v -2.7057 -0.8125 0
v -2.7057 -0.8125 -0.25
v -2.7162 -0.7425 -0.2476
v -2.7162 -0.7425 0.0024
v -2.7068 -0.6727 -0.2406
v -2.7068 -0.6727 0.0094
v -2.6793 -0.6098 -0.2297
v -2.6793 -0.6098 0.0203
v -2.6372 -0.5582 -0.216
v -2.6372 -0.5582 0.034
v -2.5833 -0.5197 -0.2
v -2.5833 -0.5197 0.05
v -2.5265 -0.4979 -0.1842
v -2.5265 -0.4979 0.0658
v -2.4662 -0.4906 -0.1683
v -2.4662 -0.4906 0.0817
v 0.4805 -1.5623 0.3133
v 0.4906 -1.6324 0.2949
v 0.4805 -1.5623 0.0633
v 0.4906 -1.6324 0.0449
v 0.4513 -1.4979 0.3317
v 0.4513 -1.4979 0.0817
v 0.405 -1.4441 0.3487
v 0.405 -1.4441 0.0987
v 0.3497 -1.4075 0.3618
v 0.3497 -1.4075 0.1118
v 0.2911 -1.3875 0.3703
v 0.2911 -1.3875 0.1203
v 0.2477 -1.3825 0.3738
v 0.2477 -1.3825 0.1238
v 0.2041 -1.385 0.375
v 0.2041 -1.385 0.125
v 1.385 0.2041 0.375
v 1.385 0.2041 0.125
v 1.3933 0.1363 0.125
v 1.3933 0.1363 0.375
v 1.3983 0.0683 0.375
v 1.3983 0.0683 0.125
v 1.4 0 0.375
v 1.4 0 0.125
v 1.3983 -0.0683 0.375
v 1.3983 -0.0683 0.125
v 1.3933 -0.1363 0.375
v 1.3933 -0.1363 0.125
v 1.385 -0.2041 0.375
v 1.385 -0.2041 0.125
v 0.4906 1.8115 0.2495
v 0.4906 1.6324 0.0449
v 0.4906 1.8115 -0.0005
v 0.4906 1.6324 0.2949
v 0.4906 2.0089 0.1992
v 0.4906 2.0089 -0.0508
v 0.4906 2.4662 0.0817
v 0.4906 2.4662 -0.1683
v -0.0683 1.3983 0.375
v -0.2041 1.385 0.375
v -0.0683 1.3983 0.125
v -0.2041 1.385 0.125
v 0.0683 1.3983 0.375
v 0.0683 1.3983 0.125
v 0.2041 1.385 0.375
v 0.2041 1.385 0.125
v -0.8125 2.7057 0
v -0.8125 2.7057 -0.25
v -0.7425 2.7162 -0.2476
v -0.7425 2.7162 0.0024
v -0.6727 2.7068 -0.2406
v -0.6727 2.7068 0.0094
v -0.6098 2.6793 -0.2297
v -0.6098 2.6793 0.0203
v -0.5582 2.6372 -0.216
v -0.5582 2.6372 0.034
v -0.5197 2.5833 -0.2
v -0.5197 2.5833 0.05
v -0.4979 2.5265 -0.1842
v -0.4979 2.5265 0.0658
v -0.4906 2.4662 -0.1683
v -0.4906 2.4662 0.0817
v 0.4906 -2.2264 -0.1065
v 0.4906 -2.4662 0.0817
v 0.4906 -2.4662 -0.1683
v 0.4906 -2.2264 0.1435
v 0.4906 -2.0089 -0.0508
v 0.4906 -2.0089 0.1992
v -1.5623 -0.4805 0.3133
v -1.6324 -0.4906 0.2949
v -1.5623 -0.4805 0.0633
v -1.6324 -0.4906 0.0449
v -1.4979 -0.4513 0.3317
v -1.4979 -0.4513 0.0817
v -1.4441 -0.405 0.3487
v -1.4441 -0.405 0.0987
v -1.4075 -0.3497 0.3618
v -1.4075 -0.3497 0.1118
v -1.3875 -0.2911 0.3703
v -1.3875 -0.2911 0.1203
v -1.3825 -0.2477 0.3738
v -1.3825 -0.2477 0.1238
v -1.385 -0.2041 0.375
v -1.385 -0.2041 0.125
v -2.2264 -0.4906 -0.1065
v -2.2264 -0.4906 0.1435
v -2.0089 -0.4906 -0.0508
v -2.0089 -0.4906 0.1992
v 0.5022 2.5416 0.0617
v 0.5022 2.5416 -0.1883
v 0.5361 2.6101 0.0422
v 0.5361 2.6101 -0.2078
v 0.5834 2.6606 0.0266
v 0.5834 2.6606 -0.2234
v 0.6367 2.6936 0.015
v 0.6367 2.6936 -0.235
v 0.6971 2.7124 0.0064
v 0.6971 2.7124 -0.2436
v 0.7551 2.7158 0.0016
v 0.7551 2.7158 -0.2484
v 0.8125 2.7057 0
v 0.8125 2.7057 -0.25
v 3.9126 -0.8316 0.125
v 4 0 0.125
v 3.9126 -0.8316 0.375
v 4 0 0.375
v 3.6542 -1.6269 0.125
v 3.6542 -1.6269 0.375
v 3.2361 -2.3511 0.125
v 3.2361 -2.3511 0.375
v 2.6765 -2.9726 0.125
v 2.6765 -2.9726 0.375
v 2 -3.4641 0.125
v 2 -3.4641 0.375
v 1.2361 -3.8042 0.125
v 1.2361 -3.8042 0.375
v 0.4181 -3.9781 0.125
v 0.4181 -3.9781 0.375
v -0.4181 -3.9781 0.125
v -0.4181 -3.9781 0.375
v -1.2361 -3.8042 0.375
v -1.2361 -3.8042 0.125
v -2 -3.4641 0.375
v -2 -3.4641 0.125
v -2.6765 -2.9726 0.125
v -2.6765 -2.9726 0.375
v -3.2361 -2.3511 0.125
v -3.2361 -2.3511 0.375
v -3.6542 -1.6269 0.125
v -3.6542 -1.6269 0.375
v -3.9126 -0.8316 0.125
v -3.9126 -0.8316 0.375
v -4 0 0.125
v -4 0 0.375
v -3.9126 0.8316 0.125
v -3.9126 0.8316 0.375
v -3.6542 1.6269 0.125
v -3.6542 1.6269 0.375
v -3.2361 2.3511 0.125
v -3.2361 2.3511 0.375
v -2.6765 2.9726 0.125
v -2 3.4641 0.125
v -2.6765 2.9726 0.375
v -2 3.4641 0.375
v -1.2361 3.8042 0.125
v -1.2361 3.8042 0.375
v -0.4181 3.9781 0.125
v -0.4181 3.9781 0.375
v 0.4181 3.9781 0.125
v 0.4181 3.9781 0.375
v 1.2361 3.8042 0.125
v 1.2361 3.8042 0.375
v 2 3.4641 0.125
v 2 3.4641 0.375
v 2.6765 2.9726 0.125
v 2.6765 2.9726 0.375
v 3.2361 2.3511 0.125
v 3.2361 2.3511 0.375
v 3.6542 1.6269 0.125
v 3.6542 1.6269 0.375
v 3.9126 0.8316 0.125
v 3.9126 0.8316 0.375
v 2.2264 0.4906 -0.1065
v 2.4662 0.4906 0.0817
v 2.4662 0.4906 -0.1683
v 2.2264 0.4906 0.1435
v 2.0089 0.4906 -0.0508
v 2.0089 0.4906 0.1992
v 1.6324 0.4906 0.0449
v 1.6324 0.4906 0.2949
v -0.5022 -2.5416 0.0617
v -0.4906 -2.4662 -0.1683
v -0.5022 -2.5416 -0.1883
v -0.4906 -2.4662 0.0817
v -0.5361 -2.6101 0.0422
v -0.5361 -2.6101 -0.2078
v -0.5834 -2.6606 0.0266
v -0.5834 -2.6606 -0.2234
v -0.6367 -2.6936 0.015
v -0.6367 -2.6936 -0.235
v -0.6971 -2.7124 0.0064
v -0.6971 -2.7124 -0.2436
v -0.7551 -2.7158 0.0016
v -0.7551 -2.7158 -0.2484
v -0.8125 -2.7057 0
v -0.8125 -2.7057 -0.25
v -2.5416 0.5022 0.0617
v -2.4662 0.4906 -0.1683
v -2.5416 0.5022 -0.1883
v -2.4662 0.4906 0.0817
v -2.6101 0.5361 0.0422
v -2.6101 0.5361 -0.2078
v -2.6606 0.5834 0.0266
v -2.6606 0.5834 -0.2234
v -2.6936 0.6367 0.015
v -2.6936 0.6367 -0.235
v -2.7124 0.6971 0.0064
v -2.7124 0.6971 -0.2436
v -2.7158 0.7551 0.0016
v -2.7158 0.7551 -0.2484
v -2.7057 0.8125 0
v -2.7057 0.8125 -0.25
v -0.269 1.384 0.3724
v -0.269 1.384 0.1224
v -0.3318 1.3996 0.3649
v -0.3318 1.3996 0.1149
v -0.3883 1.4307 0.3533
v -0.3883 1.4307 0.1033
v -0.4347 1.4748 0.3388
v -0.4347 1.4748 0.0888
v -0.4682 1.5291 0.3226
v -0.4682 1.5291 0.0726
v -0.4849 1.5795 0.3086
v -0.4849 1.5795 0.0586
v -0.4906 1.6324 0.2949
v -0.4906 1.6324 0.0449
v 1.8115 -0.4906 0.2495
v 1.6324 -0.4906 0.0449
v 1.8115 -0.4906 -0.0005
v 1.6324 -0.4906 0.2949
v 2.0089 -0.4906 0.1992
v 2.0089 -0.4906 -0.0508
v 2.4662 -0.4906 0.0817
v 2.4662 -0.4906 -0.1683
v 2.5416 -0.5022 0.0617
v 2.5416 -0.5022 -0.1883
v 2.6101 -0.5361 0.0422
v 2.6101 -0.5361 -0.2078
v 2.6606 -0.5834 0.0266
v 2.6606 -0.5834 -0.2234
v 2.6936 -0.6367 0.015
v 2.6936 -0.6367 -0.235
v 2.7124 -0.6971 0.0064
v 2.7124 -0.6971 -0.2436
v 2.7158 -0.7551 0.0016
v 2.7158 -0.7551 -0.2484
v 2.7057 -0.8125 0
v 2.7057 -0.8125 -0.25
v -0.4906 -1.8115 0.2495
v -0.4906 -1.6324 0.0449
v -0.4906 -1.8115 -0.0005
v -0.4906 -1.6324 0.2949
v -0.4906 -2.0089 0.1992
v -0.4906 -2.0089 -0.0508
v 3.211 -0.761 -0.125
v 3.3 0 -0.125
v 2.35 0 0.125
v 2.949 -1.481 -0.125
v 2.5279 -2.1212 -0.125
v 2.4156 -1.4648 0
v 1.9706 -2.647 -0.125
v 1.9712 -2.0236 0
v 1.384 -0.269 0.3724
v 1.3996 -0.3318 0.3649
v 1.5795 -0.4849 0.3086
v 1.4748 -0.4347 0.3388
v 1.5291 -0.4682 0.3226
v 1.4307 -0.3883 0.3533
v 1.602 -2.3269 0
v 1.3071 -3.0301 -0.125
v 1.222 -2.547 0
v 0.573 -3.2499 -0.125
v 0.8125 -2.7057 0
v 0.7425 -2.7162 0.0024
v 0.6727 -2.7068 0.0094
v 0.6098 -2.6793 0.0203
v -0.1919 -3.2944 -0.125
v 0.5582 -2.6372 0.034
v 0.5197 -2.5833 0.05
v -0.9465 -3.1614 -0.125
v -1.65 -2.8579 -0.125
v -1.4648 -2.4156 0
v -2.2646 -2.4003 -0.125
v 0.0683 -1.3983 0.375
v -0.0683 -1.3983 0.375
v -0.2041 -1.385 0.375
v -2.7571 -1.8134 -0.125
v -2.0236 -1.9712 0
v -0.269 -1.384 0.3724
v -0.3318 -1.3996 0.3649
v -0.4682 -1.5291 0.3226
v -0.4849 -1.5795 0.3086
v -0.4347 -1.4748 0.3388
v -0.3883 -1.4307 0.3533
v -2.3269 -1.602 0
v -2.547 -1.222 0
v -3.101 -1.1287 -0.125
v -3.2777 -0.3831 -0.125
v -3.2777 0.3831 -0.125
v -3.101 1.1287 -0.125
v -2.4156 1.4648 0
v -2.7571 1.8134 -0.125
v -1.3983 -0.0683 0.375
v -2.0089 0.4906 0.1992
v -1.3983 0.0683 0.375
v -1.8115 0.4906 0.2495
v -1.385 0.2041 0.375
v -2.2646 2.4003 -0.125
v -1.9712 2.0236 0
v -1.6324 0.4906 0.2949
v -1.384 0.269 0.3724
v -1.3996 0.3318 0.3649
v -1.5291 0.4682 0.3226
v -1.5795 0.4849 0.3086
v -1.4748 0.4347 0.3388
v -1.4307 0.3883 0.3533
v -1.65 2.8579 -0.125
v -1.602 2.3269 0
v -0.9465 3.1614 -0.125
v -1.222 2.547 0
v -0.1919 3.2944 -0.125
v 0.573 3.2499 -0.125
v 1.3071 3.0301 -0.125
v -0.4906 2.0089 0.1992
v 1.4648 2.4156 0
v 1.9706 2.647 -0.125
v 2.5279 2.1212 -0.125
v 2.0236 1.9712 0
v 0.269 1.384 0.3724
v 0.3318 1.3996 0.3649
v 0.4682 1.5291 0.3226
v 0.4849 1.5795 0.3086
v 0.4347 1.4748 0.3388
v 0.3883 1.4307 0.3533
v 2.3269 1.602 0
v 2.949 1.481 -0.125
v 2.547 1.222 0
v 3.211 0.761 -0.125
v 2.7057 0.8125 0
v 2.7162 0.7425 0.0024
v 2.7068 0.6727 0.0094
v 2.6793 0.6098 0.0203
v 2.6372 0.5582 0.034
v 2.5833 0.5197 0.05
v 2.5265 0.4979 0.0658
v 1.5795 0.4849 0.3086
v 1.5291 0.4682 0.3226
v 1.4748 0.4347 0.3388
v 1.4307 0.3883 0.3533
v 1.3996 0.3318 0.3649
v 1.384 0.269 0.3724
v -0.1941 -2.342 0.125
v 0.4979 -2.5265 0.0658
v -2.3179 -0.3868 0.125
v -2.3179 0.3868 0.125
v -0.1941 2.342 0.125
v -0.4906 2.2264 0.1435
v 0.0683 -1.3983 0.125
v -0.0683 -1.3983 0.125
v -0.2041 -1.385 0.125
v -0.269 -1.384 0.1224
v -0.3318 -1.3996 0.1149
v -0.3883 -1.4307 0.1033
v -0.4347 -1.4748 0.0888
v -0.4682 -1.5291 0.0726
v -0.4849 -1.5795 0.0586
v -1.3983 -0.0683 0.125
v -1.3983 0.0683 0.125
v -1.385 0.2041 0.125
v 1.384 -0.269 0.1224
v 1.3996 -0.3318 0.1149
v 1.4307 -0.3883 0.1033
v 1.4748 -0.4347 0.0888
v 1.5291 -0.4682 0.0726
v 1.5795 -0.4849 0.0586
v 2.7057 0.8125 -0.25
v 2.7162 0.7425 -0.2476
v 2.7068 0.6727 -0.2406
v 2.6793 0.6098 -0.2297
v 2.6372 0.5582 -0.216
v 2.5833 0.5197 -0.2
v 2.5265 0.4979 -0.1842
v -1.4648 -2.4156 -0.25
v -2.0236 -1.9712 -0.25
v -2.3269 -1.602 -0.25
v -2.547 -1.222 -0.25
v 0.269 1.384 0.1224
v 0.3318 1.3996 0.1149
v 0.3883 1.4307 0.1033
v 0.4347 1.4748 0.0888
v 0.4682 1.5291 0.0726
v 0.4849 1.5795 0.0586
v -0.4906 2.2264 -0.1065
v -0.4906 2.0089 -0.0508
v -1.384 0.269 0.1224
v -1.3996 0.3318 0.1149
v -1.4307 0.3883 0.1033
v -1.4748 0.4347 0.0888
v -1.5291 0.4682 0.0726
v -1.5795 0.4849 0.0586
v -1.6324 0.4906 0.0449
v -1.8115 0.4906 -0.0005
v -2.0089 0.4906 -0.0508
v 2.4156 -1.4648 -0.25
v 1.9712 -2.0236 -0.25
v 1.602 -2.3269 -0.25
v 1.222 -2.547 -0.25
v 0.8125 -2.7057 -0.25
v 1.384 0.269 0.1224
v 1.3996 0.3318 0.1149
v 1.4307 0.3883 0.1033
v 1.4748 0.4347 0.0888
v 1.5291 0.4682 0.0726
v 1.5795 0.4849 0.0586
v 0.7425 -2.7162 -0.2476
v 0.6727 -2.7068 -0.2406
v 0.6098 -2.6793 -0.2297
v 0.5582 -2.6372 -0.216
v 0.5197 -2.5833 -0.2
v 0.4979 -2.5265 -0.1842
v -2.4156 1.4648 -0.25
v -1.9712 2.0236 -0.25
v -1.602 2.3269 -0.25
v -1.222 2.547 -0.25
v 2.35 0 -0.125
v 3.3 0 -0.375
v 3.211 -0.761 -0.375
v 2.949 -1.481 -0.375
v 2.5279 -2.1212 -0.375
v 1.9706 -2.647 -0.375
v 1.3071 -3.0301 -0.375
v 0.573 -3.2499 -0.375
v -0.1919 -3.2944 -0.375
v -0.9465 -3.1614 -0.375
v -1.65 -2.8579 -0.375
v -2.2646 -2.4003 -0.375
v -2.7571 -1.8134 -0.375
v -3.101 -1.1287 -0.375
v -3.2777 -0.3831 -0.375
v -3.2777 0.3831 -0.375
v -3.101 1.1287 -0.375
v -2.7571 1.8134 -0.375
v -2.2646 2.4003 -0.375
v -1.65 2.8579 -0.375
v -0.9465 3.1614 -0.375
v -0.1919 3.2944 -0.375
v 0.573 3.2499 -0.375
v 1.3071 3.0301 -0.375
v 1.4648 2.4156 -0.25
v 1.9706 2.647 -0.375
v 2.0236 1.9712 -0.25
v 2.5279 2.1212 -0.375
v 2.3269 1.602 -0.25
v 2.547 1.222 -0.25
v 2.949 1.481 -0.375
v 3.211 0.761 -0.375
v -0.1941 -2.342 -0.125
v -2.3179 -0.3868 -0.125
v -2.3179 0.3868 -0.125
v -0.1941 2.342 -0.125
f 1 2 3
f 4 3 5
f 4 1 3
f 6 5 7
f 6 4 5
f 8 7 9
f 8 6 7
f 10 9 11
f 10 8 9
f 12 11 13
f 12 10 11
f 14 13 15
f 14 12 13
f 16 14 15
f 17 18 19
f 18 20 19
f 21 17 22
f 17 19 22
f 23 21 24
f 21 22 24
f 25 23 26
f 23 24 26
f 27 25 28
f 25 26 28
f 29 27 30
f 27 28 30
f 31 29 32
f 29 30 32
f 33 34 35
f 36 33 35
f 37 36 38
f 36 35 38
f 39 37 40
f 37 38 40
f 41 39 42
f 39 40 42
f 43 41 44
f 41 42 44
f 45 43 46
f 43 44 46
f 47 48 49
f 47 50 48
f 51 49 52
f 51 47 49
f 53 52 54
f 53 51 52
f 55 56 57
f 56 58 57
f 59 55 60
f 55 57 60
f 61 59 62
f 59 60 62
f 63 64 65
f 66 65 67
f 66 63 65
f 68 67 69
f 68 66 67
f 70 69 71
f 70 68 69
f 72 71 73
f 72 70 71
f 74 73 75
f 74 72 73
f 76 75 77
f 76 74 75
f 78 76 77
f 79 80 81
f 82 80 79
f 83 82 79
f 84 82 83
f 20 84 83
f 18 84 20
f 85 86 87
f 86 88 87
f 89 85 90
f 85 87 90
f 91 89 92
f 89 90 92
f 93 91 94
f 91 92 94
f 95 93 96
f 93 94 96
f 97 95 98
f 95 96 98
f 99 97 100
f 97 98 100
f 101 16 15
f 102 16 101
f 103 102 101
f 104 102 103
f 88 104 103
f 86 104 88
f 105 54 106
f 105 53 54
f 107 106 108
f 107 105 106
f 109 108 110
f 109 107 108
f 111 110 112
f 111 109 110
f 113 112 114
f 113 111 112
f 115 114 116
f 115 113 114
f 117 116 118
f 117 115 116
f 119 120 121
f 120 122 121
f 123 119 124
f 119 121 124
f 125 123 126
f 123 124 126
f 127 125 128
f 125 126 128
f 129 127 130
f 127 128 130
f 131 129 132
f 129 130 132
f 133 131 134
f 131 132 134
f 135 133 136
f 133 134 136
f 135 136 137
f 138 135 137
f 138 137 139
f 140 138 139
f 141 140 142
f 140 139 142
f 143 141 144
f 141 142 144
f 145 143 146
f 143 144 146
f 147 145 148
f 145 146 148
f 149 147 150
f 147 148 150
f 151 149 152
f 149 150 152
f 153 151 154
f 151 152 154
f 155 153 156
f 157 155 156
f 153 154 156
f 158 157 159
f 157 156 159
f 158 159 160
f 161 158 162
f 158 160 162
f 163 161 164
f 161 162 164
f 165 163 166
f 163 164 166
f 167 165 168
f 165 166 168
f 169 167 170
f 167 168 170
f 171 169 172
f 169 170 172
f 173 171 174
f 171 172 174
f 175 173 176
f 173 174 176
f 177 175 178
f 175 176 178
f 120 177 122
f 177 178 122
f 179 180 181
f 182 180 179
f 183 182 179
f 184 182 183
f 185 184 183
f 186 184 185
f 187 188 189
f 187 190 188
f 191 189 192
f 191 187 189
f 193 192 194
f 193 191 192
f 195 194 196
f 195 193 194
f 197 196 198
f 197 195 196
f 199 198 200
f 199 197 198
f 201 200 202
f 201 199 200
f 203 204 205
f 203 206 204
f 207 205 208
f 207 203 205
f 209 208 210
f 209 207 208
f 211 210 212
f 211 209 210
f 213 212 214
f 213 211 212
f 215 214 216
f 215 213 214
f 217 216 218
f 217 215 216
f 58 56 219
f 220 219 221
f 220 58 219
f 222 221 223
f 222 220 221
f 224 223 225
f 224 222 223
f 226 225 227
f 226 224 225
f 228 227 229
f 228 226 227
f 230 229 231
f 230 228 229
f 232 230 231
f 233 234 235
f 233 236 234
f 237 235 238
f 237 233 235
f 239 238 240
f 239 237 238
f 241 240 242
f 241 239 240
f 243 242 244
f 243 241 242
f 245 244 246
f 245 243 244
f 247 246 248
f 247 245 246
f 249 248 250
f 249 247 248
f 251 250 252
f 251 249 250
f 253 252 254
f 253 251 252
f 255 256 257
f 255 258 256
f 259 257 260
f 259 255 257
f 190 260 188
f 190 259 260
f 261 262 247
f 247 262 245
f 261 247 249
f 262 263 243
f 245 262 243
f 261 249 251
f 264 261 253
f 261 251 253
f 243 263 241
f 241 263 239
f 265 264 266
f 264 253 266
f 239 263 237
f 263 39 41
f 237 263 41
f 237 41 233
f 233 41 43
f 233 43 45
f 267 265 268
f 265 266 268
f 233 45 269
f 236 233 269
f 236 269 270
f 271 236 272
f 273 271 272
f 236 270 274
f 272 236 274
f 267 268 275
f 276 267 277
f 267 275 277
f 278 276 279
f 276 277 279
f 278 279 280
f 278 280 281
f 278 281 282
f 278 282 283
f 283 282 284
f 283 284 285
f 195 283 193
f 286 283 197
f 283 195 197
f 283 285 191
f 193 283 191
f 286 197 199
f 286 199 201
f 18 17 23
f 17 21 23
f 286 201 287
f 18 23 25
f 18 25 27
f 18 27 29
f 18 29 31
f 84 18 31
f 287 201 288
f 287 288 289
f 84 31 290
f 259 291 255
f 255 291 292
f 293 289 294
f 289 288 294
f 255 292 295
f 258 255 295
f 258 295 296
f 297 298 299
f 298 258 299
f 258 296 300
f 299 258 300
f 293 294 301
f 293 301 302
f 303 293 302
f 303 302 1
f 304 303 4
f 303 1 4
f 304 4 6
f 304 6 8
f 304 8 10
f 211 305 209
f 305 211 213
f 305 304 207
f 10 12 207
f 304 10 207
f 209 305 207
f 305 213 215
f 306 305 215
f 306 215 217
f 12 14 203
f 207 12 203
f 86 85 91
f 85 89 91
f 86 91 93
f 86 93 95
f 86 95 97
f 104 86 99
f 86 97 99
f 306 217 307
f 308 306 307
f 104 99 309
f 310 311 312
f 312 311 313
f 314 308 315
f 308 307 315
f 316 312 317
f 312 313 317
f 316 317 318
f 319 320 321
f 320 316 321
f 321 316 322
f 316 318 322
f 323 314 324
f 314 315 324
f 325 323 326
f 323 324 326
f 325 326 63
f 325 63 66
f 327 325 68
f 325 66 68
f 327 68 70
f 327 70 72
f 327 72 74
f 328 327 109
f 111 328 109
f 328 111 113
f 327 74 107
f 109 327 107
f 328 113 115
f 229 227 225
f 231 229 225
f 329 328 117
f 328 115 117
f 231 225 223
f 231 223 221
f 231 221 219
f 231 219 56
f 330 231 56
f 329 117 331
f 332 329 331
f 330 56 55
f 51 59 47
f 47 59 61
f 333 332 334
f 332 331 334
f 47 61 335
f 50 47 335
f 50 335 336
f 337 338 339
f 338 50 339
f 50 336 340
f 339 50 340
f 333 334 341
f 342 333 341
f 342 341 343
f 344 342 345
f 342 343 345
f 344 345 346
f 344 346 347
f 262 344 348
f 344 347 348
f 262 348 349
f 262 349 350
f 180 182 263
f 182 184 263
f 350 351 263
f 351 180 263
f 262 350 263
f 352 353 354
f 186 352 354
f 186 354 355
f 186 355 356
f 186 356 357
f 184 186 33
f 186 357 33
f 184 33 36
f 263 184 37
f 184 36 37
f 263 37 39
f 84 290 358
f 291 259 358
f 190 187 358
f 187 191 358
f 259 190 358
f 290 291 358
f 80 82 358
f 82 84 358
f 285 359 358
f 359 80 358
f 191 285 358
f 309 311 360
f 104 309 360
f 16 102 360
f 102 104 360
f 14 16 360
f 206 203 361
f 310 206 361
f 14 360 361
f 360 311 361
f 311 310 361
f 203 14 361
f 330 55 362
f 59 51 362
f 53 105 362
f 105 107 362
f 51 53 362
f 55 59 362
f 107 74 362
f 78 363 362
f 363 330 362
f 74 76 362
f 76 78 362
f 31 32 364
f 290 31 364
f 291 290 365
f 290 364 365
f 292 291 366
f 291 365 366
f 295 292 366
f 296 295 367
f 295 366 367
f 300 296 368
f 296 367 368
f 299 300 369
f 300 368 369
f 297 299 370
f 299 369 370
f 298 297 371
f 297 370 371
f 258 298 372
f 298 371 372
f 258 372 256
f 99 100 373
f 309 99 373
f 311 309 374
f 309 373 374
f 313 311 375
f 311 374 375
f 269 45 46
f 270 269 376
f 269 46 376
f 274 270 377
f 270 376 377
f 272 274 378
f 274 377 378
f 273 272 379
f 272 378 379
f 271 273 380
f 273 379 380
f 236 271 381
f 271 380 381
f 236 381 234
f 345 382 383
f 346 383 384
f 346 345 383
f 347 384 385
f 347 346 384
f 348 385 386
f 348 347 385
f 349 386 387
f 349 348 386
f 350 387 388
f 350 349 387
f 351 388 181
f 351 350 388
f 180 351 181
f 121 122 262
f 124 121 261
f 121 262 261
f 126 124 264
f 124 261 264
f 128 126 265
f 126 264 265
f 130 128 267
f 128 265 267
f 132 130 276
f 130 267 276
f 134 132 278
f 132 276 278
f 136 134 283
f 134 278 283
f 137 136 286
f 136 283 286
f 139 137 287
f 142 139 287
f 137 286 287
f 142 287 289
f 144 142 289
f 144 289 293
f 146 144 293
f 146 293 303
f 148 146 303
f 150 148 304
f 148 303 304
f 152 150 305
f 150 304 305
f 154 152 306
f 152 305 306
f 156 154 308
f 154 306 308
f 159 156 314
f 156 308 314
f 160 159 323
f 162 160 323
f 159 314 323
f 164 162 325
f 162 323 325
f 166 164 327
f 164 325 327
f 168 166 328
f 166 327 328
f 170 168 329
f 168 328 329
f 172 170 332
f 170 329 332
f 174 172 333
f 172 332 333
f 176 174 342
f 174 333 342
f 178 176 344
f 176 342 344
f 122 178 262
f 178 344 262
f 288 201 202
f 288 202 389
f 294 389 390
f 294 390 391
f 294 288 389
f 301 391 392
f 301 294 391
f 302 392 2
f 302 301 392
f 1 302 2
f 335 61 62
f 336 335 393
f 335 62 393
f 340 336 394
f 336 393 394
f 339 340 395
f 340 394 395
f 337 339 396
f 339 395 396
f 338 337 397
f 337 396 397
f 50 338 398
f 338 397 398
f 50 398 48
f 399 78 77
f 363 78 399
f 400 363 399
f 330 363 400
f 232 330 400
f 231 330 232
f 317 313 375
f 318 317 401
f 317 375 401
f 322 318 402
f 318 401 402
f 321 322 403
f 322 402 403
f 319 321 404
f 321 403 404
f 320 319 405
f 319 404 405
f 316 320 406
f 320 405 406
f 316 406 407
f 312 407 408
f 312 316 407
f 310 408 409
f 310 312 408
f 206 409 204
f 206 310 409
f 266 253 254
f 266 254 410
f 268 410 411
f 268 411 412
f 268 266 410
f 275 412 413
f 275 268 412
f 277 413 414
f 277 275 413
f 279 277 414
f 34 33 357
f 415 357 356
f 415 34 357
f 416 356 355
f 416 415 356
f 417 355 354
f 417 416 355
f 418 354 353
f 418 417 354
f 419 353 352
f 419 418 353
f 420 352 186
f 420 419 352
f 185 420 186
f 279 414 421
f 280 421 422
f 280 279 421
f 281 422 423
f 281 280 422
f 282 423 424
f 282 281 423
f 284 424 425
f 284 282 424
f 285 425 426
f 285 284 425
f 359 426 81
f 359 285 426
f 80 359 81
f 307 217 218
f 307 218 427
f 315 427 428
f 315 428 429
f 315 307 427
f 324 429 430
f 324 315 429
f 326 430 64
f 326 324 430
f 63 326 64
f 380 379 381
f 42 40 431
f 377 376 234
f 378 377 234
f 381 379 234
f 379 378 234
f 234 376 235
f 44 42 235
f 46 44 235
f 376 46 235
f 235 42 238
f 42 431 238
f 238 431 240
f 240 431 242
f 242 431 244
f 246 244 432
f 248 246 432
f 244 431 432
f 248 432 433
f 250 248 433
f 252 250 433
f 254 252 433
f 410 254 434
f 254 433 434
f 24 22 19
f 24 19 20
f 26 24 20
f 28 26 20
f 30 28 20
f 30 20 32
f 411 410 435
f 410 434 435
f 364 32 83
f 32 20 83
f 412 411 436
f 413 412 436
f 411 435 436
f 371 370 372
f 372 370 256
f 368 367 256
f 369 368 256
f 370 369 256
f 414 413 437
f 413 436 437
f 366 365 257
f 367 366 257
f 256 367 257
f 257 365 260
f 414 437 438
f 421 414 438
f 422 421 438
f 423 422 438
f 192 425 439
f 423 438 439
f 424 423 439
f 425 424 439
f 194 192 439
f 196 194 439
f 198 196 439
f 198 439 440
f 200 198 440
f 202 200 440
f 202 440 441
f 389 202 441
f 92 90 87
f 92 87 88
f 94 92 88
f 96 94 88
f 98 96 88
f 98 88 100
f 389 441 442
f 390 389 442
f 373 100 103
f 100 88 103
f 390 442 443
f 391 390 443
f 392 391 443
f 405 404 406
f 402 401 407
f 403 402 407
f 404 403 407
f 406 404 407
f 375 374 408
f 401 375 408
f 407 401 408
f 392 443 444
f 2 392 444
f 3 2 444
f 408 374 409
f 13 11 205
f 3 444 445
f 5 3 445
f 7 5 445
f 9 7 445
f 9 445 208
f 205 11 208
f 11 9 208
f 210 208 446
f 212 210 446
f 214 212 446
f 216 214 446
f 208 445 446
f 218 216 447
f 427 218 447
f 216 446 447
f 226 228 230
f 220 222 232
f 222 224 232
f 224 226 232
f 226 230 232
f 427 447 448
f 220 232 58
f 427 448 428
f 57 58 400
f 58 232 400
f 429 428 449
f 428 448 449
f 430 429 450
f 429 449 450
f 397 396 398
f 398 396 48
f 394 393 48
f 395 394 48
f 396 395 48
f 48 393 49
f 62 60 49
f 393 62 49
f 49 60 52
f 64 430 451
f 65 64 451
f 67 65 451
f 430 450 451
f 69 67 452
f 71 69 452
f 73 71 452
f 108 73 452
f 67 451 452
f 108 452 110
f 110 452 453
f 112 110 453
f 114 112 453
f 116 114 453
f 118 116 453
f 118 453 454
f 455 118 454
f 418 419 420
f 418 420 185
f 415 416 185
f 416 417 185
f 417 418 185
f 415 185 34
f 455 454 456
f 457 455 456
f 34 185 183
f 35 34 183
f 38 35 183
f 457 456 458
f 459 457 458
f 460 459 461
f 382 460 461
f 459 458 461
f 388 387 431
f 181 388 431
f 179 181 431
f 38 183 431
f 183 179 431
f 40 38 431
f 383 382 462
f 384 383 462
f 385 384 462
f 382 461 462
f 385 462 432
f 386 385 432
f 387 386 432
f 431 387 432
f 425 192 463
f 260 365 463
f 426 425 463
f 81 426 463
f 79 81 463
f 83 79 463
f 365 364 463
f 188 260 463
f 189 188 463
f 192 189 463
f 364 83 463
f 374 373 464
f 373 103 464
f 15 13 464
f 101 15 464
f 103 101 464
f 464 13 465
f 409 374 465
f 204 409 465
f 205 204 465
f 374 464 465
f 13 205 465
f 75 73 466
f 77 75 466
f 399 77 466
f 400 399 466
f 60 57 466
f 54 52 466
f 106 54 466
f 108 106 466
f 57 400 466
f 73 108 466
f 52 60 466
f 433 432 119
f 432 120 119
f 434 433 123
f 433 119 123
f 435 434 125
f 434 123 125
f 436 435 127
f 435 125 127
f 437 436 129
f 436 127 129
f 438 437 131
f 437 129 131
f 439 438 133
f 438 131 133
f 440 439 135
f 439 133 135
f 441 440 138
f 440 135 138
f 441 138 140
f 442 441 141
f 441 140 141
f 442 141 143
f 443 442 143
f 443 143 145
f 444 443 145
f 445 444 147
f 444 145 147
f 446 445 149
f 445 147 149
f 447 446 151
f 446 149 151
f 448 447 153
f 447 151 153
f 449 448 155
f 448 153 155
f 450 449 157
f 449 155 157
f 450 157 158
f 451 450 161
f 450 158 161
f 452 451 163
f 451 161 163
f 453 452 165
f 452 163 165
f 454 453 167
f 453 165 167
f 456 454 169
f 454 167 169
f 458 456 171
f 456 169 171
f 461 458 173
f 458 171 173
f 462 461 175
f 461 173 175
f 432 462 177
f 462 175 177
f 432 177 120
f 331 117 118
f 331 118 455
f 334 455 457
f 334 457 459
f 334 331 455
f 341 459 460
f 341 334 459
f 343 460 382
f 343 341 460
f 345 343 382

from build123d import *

# Parameters (mm, degrees)
CUT_EXTRUDE1_DEPTH       = 6.669270235
FILLET1_R                = 0.25
CIRPATTERN1_COUNT        = 4
FILLET1_OF_CIRPATTERN1_R = 0.25


with BuildPart() as part:
    # Sketch2 → Revolve1 (revolve)
    with BuildSketch(Plane(origin=(0, 0, 0), x_dir=(0, 0, -1), z_dir=(1, 0, 0))):
        Polygon((-0.375, 4), (0.125, 3.3), (-0.375, 1.4), (-0.125, 1.4), (0.375, 3.3), (-0.125, 4), align=None)
    revolve(axis=Axis((0, 0, 0.375), (0, 0, -1)))

    # Sketch3 → Cut-Extrude1 (cut, symmetric)
    with BuildSketch(Plane.XY):
        with BuildLine():
            Line((-0.490556102, 2.782081902), (-0.490556102, 0.490556102))
            Line((-0.490556102, 0.490556102), (-2.782081902, 0.490556102))
            ThreePointArc((-2.782081902, 0.490556102), (-1.997576657, 1.997576657), (-0.490556102, 2.782081902))
        make_face()
    cut_extrude1 = extrude(amount=CUT_EXTRUDE1_DEPTH, both=True, mode=Mode.SUBTRACT)

    # Fillet1
    fillet1_edges = [part.edges().sort_by_distance(p)[0] for p in [
        (-1.311241668, 0.490556102, 0.25),
        (-0.490556102, 1.311241668, 0.25),
        (-2.782081902, 0.490556102, -0.125),
        (-0.490556102, 2.782081902, -0.125),
    ]]
    fillet(fillet1_edges, radius=FILLET1_R)

    # CirPattern1: Cut-Extrude1 ×4 about axis
    cirpattern1_axis = Axis((0, 0, 0.375), (0, 0, 1))
    for i in range(1, CIRPATTERN1_COUNT):
        add(cut_extrude1.rotate(cirpattern1_axis, i * 360 / CIRPATTERN1_COUNT), mode=Mode.SUBTRACT)

    # Fillet1 of CirPattern1
    fillet1_of_cirpattern1_edges = [part.edges().sort_by_distance(p)[0] for p in [
        (-0.490556102, -1.311241668, 0.25),
        (-1.311241668, -0.490556102, 0.25),
        (-0.490556102, -2.782081902, -0.125),
        (-2.782081902, -0.490556102, -0.125),
        (1.311241668, -0.490556102, 0.25),
        (0.490556102, -1.311241668, 0.25),
        (2.782081902, -0.490556102, -0.125),
        (0.490556102, -2.782081902, -0.125),
        (0.490556102, 1.311241668, 0.25),
        (1.311241668, 0.490556102, 0.25),
        (0.490556102, 2.782081902, -0.125),
        (2.782081902, 0.490556102, -0.125),
    ]]
    fillet(fillet1_of_cirpattern1_edges, radius=FILLET1_OF_CIRPATTERN1_R)


solid = part.part
